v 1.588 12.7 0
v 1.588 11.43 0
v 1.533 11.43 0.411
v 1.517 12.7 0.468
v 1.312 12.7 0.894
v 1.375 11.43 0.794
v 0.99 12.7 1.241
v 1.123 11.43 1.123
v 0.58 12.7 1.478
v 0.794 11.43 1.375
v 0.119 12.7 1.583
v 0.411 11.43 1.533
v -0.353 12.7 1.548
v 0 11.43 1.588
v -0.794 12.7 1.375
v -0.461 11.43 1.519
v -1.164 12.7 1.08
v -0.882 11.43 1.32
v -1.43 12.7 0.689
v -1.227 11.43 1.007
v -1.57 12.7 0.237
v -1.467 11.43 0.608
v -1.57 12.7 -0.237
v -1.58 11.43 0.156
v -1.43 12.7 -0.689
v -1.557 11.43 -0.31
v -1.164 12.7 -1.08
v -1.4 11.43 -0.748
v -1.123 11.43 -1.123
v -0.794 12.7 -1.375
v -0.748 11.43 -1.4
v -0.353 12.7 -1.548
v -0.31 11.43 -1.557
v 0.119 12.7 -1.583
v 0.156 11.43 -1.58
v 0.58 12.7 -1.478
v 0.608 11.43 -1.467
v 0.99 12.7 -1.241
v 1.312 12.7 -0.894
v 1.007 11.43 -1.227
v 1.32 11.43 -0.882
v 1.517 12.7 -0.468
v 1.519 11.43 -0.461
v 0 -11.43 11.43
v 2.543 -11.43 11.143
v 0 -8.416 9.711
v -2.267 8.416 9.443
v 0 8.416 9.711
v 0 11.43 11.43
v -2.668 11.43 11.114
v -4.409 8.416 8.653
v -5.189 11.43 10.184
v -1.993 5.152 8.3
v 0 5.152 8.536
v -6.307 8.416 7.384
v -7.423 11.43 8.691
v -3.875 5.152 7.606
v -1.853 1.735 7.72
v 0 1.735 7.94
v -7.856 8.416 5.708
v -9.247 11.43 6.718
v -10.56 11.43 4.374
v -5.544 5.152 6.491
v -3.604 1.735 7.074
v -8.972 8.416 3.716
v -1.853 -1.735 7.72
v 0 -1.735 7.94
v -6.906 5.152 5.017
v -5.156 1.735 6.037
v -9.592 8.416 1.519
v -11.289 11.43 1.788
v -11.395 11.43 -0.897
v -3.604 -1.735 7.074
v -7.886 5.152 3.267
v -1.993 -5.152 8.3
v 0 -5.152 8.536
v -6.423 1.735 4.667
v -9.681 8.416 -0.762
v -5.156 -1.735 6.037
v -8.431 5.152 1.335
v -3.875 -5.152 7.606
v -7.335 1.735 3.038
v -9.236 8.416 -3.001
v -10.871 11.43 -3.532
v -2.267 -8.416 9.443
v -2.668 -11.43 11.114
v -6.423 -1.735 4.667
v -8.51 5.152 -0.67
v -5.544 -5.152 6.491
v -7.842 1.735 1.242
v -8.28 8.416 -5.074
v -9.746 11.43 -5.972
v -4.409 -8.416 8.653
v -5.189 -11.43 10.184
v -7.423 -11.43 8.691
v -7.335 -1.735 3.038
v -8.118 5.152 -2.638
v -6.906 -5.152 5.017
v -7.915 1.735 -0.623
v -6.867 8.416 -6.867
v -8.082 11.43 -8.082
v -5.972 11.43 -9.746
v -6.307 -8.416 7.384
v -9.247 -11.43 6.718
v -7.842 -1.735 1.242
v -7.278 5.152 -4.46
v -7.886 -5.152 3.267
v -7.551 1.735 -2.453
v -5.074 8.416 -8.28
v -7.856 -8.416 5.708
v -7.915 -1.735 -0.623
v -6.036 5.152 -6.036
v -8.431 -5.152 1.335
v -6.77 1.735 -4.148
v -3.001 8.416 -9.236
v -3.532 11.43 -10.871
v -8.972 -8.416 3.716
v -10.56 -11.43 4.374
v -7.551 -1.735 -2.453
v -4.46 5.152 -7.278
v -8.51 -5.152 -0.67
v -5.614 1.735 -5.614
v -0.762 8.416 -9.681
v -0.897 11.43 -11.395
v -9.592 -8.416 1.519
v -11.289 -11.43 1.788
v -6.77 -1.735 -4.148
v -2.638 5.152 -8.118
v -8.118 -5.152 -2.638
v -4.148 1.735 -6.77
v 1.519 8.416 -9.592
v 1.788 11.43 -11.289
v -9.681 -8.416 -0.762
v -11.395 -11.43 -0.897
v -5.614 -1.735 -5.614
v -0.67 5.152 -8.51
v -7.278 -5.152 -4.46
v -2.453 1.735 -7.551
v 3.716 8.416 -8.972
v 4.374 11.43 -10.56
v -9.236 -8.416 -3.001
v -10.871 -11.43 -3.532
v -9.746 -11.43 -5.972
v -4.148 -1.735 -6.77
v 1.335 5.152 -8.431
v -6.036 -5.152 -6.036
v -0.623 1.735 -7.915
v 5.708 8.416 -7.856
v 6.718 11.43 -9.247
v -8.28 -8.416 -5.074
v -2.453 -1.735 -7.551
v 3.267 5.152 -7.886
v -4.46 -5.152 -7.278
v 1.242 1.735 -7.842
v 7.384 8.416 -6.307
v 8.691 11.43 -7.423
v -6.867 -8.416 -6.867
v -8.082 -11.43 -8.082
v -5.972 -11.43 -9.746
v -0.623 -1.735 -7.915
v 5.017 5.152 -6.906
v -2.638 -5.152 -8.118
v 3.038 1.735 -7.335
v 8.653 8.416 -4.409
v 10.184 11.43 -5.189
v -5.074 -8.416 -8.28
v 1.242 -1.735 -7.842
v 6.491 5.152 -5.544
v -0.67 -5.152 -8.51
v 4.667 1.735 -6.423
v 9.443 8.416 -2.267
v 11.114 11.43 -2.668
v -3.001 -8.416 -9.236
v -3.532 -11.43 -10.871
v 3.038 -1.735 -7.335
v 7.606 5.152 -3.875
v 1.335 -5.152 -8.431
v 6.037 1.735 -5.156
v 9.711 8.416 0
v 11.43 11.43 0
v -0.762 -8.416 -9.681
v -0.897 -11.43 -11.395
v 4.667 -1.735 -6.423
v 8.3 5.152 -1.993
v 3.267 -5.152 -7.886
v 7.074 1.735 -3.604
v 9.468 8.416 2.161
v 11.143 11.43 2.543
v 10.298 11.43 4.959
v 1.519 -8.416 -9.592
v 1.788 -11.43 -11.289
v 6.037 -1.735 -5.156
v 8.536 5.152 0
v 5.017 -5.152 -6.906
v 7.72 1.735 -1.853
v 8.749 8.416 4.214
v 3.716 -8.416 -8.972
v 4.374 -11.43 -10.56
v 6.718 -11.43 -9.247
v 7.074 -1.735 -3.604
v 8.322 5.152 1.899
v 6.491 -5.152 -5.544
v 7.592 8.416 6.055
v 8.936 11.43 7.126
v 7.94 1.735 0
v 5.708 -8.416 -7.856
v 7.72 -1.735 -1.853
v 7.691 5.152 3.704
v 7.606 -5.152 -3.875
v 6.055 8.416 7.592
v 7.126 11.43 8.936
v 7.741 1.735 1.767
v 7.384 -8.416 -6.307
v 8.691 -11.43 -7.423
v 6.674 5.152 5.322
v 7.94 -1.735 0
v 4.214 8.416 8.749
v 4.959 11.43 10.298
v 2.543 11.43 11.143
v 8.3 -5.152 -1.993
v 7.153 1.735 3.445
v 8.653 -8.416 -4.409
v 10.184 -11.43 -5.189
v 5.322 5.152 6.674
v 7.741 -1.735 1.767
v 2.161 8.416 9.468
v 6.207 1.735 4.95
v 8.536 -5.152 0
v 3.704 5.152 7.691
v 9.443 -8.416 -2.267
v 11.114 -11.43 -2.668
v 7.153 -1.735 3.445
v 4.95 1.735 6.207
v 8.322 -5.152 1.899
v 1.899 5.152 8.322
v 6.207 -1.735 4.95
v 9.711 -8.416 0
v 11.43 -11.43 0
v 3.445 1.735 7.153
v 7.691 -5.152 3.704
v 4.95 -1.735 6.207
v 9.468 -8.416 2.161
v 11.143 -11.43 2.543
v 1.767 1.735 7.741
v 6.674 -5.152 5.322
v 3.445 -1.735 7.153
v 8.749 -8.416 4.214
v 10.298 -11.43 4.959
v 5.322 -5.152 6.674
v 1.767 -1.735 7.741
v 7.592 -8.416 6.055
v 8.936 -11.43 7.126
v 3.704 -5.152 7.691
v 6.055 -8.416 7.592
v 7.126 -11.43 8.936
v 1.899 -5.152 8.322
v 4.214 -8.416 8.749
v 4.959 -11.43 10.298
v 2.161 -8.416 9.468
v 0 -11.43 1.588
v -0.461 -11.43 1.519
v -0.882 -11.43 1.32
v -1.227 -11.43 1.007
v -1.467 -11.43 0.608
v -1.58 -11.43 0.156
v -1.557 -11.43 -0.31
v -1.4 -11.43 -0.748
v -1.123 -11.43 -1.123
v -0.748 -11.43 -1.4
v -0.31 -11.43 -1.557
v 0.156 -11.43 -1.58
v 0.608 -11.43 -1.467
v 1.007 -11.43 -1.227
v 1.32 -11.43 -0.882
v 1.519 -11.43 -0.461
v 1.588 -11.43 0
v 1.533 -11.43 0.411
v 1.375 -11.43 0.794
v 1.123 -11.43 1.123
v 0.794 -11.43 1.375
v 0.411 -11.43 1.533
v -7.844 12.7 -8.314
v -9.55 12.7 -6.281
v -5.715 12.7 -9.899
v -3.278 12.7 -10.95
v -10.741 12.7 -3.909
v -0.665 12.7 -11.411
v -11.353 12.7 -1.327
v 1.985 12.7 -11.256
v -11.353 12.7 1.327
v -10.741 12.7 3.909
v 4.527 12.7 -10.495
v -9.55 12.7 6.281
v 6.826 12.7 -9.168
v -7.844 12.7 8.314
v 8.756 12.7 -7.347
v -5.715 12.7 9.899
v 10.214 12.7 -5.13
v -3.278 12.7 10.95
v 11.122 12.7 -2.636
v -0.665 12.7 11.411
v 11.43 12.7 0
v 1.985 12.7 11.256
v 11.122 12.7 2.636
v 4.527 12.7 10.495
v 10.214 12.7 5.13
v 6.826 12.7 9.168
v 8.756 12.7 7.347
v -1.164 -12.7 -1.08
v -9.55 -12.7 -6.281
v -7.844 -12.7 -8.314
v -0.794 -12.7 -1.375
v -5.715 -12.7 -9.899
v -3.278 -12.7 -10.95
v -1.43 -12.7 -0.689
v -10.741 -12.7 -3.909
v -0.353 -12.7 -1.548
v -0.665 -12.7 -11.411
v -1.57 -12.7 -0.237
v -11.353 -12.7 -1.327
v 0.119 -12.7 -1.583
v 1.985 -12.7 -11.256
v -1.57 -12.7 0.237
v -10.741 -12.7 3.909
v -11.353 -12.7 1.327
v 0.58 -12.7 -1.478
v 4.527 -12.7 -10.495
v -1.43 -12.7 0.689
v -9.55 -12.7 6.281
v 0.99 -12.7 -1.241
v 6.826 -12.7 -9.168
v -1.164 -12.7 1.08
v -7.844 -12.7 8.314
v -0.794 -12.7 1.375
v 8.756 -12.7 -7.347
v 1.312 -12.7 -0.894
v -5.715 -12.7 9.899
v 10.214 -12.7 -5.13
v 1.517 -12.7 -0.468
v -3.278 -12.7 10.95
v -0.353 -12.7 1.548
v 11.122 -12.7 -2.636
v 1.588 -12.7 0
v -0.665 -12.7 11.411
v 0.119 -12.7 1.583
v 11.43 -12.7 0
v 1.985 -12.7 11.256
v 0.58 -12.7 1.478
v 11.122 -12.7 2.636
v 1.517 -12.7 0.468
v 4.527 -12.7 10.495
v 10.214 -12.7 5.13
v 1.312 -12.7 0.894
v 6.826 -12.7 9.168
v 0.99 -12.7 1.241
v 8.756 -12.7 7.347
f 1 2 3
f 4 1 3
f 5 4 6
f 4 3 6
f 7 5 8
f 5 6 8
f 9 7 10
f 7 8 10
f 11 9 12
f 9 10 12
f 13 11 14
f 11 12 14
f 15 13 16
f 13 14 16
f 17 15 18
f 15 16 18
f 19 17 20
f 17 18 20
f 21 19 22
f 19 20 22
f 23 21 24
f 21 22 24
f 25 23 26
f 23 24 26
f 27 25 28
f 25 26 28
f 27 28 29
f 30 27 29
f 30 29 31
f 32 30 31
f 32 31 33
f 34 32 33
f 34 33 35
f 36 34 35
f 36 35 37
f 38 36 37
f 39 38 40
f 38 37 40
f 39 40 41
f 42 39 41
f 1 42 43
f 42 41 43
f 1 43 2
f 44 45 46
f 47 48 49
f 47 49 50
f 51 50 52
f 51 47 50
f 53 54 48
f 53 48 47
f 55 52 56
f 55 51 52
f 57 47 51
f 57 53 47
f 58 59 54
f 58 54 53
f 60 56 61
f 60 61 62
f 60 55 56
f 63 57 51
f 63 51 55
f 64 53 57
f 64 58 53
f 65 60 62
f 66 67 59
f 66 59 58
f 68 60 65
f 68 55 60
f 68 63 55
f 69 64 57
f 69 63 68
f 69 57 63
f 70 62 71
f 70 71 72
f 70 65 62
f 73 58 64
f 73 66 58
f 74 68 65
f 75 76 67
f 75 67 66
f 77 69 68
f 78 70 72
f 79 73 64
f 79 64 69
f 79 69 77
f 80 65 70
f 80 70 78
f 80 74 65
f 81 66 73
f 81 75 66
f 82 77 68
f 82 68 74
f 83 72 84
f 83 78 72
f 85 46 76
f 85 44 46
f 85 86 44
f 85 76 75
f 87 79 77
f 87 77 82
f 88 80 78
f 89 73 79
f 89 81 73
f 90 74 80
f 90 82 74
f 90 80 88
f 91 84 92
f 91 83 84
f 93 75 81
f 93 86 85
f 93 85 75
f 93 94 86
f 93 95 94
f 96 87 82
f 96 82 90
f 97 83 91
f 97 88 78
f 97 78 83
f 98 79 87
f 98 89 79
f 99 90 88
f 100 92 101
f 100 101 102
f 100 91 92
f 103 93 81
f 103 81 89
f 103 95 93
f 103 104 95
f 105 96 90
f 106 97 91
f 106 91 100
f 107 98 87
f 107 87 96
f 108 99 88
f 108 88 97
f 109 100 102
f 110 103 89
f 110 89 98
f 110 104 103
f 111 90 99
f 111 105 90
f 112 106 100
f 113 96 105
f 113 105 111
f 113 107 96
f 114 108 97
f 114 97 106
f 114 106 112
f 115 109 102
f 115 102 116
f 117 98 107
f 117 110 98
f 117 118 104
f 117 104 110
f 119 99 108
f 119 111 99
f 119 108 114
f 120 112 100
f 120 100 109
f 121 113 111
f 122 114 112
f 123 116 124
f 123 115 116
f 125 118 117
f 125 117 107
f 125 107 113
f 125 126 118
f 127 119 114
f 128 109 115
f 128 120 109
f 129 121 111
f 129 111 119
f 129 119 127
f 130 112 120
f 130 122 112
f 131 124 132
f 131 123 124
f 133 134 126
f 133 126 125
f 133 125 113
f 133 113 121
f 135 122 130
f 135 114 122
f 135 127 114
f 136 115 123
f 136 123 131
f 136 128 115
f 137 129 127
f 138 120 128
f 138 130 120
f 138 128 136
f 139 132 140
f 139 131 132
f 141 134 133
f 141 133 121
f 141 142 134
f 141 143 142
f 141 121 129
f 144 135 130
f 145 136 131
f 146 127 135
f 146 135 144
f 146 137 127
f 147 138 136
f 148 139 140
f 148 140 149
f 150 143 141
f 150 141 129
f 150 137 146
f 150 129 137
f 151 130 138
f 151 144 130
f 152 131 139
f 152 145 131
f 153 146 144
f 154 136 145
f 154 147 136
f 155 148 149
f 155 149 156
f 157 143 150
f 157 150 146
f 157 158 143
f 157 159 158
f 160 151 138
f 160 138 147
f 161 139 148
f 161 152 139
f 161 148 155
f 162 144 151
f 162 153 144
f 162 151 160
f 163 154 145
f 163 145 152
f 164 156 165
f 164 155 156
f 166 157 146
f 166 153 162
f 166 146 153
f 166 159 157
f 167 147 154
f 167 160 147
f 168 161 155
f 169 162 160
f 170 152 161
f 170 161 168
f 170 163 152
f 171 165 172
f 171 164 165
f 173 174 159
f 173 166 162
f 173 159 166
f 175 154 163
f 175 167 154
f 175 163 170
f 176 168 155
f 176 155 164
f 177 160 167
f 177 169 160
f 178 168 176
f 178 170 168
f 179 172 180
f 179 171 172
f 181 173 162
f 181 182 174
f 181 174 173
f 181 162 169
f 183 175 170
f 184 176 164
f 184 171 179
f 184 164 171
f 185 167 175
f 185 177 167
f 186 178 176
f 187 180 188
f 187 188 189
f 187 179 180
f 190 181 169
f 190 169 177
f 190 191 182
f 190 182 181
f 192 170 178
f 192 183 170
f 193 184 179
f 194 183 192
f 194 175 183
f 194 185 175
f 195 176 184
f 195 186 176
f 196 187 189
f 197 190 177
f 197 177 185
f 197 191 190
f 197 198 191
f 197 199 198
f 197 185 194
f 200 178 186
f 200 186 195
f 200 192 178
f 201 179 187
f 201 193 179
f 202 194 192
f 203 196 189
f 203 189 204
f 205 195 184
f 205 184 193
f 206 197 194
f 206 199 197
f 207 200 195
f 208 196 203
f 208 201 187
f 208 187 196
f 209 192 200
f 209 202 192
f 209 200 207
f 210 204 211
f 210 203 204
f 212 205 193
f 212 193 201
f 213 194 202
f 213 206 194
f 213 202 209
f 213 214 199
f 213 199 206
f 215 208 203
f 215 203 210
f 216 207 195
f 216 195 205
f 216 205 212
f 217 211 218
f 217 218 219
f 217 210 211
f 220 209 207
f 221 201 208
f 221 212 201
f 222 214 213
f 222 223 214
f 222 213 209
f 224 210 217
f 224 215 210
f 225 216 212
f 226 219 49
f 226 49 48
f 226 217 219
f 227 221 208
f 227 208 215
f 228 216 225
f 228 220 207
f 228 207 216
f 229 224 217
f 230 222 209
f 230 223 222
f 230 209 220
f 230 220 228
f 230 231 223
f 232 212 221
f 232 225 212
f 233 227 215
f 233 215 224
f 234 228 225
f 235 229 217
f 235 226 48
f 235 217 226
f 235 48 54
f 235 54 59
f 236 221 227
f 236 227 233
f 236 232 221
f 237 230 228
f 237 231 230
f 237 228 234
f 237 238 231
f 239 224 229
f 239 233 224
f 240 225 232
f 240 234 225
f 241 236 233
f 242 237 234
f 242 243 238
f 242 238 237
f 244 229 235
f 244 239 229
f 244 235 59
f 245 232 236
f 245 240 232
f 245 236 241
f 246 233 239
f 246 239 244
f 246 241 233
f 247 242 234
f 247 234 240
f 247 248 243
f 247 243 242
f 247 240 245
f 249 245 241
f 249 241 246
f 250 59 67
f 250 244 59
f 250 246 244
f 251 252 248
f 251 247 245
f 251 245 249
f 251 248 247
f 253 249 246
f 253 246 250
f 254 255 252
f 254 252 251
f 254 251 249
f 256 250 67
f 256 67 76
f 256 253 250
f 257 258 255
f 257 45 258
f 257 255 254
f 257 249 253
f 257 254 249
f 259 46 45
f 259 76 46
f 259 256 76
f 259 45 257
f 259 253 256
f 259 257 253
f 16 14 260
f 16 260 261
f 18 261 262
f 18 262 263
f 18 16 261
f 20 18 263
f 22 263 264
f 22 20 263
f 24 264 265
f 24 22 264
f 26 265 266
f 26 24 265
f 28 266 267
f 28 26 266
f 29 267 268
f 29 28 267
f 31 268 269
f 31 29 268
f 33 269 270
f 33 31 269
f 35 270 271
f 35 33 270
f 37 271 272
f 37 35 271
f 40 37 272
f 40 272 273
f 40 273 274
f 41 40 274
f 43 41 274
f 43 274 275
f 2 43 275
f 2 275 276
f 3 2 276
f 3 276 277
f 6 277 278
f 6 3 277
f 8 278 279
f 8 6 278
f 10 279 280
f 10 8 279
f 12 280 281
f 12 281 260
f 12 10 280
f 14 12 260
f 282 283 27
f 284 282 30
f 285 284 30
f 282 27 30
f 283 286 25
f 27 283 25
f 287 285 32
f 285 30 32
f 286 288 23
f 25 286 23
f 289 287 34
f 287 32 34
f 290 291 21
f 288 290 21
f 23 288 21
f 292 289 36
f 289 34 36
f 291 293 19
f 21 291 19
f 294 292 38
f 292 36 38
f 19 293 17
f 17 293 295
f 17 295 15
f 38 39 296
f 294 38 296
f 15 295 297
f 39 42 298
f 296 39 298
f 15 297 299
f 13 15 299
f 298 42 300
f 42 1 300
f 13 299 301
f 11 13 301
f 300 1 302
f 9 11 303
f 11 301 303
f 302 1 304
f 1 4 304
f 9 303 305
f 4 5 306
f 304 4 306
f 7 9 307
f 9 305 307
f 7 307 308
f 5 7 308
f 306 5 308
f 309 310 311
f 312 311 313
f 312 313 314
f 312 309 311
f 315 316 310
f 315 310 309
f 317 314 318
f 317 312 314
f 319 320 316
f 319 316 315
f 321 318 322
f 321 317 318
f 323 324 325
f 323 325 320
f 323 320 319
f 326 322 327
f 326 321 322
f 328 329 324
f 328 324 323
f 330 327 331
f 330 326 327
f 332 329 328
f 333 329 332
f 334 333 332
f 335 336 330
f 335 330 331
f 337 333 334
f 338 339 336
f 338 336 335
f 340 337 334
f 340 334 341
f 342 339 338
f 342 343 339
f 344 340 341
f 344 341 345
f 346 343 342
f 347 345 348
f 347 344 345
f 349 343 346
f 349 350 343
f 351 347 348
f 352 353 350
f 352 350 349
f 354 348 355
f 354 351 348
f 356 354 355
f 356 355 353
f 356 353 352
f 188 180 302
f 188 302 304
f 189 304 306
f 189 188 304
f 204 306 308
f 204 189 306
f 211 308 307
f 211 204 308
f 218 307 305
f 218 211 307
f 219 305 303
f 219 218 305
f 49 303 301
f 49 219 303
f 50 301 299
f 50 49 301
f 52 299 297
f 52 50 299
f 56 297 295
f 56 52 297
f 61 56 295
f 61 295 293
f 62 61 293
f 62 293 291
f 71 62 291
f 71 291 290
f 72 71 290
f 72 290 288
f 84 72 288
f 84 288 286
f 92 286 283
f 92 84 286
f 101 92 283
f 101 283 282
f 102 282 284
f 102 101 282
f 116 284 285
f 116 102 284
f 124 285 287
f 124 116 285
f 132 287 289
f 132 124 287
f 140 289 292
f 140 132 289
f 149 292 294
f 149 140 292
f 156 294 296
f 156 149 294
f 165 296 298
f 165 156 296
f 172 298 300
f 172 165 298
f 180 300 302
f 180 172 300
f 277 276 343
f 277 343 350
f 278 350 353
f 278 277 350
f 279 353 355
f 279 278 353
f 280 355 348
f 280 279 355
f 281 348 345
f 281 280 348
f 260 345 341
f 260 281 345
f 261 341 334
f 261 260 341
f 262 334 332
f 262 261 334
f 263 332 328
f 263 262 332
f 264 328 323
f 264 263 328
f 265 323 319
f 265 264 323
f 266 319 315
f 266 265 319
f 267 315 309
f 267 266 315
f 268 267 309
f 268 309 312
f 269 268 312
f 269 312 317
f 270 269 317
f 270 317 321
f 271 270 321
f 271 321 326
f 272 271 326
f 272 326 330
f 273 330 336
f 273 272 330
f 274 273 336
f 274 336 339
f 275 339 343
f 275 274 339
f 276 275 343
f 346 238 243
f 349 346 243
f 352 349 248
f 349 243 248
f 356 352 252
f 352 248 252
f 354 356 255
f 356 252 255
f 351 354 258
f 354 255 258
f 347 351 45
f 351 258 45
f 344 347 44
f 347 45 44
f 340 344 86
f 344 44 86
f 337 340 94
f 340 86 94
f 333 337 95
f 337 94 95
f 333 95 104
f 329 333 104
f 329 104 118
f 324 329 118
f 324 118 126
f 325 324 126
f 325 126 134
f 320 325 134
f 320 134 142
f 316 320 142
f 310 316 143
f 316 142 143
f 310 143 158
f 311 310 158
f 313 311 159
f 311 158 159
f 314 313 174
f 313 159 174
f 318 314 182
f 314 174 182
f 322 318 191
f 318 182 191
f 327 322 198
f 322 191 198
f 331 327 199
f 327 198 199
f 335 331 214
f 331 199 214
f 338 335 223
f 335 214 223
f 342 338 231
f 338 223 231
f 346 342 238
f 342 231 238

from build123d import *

# Parameters (mm, degrees)
F2_R     = 11.43
F2_R_2   = 1.5875
F3_DEPTH = 1.27
F5_R     = 11.43
F5_R_2   = 1.5875
F6_DEPTH = 1.27


# Not quite as in the source:
# - a variable given as a bare number and used for a length is read in inches; the dataset says mm whatever the document's units were


with BuildPart() as f3:
    # F2 (on offset) → F3 (new body)
    with BuildSketch(Plane.XZ.offset(11.43)):
        Circle(F2_R)
        Circle(F2_R_2, mode=Mode.SUBTRACT)
    extrude(amount=F3_DEPTH)



with BuildPart() as f6:
    # F5 (on offset) → F6 (new body)
    with BuildSketch(Plane.XZ.offset(-11.43)):
        Circle(F5_R)
        Circle(F5_R_2, mode=Mode.SUBTRACT)
    extrude(amount=-F6_DEPTH)


with BuildPart() as f3_1:
    add(f3.part)

    add(f6.part)  # F8 merges F6
    # F7 (on Right) → F8 (revolve)
    with BuildSketch(Plane.YZ):
        with BuildLine():
            ThreePointArc((11.43, 11.43), (0, 7.8646021863), (-11.43, 11.43))
            Line((-11.43, 11.43), (-11.43, 1.5875))
            Line((-11.43, 1.5875), (11.43, 1.5875))
            Line((11.43, 1.5875), (11.43, 11.43))
        make_face()
    revolve(axis=Axis((0, 0, 0), (0, -1, 0)))


solid = f3_1.part
